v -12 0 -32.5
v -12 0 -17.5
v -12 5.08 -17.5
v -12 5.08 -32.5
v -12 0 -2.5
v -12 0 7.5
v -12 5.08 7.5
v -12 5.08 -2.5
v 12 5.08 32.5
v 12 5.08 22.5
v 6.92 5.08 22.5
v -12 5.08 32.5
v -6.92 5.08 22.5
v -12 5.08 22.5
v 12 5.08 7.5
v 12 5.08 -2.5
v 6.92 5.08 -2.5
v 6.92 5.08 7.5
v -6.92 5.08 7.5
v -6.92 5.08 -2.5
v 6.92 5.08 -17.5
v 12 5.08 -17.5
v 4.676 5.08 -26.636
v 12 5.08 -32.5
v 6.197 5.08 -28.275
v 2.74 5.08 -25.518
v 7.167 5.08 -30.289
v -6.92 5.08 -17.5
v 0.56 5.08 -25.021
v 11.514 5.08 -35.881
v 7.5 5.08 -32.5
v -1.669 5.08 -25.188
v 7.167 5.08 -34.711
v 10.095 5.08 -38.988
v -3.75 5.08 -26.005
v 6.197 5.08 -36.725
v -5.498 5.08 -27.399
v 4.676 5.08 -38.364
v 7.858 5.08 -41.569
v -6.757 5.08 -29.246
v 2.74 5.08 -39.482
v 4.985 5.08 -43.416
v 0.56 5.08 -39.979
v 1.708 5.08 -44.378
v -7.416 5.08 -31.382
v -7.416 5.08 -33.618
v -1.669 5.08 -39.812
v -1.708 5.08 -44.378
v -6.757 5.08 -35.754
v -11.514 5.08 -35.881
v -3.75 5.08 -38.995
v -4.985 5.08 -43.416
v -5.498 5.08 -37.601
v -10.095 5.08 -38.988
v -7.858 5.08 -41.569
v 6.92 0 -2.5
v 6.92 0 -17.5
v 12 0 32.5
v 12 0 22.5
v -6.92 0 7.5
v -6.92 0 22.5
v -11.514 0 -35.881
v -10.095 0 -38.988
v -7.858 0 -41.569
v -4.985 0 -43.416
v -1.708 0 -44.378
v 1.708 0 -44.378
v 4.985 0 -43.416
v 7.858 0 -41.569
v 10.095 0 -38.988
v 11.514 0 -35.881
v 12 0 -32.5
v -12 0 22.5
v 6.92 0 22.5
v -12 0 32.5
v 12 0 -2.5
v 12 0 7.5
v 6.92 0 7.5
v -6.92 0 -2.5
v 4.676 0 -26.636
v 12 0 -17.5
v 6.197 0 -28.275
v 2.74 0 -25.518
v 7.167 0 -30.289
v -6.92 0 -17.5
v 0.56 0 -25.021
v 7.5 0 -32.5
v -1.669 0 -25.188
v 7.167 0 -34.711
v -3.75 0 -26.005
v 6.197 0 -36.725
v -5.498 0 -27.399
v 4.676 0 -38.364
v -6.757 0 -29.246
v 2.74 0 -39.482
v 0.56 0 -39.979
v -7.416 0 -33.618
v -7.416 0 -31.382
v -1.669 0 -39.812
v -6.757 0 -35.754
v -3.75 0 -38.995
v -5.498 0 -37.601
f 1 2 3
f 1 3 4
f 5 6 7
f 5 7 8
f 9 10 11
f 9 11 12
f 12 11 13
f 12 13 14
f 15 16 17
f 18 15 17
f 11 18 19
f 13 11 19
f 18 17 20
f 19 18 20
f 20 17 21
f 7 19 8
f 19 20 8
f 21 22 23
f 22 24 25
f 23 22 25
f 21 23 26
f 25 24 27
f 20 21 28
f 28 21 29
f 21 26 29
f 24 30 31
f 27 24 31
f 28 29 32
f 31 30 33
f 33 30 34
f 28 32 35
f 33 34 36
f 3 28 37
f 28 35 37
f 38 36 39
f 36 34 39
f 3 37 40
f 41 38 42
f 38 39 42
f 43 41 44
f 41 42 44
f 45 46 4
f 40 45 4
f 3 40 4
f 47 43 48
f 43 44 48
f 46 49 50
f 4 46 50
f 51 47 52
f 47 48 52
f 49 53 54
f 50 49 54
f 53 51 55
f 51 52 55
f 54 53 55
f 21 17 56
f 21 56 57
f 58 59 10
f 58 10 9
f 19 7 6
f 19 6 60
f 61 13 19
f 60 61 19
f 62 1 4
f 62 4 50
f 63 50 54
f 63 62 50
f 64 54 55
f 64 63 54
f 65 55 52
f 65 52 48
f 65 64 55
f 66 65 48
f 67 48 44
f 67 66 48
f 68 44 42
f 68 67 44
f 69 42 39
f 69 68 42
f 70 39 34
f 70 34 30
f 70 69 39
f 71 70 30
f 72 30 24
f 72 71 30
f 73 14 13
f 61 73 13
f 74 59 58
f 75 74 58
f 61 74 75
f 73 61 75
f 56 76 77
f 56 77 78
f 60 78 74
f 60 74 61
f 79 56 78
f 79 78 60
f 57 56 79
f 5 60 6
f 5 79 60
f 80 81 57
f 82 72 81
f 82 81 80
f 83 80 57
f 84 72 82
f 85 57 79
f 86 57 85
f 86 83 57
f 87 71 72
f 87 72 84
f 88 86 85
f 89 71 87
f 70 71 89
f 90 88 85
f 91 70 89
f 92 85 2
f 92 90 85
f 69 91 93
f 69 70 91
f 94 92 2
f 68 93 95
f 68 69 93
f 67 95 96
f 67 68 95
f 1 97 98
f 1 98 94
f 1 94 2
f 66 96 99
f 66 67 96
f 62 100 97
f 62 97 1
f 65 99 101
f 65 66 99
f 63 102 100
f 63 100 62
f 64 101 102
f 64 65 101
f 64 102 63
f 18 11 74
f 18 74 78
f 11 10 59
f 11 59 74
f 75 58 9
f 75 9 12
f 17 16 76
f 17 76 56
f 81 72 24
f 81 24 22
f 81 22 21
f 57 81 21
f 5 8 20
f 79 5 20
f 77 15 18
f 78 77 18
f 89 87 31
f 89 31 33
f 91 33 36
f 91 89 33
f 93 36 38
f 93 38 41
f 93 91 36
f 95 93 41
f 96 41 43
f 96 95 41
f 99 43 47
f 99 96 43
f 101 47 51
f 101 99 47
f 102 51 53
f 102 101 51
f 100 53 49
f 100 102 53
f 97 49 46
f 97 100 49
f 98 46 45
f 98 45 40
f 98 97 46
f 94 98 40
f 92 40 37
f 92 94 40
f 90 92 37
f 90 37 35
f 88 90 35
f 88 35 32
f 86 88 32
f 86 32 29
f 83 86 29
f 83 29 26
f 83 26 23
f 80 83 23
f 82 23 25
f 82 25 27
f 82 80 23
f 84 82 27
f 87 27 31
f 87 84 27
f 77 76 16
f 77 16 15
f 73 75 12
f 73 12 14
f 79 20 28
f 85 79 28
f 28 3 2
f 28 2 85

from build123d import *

# Parameters (mm, degrees)
SKETCH1_R           = 7.5
BOSS_EXTRUDE1_DEPTH = 5.08
SKETCH2_W           = 5.08
SKETCH2_H           = 15
CUT_EXTRUDE1_DEPTH  = 5.08


with BuildPart() as part:
    # Sketch1 → Boss-Extrude1 (new body)
    with BuildSketch(Plane(origin=(0, 0, 0), x_dir=(1, 0, 0), z_dir=(0, 1, 0))):
        with BuildLine():
            Line((12, -32.5), (-12, -32.5))
            Line((-12, -32.5), (-12, 32.5))
            ThreePointArc((-12, 32.5), (0, 44.5), (12, 32.5))
            Line((12, 32.5), (12, -32.5))
        make_face()
        with Locations((0, 32.5)):
            Circle(SKETCH1_R, mode=Mode.SUBTRACT)
    extrude(amount=BOSS_EXTRUDE1_DEPTH)

    # Sketch2 → Cut-Extrude1 (cut)
    with BuildSketch(Plane(origin=(0, 5.08, 0), x_dir=(1, 0, 0), z_dir=(0, 1, 0))):
        with Locations((-9.46, -15)):
            Rectangle(SKETCH2_W, SKETCH2_H)
        with Locations((-9.46, 10)):
            Rectangle(SKETCH2_W, SKETCH2_H)
    cut_extrude1 = extrude(amount=-CUT_EXTRUDE1_DEPTH, mode=Mode.SUBTRACT)

    # Mirror2: Cut-Extrude1 across plane
    add(cut_extrude1.mirror(Plane(origin=(0, 0, 0), x_dir=(0, 0, 1), z_dir=(1, 0, 0))), mode=Mode.SUBTRACT)


solid = part.part
